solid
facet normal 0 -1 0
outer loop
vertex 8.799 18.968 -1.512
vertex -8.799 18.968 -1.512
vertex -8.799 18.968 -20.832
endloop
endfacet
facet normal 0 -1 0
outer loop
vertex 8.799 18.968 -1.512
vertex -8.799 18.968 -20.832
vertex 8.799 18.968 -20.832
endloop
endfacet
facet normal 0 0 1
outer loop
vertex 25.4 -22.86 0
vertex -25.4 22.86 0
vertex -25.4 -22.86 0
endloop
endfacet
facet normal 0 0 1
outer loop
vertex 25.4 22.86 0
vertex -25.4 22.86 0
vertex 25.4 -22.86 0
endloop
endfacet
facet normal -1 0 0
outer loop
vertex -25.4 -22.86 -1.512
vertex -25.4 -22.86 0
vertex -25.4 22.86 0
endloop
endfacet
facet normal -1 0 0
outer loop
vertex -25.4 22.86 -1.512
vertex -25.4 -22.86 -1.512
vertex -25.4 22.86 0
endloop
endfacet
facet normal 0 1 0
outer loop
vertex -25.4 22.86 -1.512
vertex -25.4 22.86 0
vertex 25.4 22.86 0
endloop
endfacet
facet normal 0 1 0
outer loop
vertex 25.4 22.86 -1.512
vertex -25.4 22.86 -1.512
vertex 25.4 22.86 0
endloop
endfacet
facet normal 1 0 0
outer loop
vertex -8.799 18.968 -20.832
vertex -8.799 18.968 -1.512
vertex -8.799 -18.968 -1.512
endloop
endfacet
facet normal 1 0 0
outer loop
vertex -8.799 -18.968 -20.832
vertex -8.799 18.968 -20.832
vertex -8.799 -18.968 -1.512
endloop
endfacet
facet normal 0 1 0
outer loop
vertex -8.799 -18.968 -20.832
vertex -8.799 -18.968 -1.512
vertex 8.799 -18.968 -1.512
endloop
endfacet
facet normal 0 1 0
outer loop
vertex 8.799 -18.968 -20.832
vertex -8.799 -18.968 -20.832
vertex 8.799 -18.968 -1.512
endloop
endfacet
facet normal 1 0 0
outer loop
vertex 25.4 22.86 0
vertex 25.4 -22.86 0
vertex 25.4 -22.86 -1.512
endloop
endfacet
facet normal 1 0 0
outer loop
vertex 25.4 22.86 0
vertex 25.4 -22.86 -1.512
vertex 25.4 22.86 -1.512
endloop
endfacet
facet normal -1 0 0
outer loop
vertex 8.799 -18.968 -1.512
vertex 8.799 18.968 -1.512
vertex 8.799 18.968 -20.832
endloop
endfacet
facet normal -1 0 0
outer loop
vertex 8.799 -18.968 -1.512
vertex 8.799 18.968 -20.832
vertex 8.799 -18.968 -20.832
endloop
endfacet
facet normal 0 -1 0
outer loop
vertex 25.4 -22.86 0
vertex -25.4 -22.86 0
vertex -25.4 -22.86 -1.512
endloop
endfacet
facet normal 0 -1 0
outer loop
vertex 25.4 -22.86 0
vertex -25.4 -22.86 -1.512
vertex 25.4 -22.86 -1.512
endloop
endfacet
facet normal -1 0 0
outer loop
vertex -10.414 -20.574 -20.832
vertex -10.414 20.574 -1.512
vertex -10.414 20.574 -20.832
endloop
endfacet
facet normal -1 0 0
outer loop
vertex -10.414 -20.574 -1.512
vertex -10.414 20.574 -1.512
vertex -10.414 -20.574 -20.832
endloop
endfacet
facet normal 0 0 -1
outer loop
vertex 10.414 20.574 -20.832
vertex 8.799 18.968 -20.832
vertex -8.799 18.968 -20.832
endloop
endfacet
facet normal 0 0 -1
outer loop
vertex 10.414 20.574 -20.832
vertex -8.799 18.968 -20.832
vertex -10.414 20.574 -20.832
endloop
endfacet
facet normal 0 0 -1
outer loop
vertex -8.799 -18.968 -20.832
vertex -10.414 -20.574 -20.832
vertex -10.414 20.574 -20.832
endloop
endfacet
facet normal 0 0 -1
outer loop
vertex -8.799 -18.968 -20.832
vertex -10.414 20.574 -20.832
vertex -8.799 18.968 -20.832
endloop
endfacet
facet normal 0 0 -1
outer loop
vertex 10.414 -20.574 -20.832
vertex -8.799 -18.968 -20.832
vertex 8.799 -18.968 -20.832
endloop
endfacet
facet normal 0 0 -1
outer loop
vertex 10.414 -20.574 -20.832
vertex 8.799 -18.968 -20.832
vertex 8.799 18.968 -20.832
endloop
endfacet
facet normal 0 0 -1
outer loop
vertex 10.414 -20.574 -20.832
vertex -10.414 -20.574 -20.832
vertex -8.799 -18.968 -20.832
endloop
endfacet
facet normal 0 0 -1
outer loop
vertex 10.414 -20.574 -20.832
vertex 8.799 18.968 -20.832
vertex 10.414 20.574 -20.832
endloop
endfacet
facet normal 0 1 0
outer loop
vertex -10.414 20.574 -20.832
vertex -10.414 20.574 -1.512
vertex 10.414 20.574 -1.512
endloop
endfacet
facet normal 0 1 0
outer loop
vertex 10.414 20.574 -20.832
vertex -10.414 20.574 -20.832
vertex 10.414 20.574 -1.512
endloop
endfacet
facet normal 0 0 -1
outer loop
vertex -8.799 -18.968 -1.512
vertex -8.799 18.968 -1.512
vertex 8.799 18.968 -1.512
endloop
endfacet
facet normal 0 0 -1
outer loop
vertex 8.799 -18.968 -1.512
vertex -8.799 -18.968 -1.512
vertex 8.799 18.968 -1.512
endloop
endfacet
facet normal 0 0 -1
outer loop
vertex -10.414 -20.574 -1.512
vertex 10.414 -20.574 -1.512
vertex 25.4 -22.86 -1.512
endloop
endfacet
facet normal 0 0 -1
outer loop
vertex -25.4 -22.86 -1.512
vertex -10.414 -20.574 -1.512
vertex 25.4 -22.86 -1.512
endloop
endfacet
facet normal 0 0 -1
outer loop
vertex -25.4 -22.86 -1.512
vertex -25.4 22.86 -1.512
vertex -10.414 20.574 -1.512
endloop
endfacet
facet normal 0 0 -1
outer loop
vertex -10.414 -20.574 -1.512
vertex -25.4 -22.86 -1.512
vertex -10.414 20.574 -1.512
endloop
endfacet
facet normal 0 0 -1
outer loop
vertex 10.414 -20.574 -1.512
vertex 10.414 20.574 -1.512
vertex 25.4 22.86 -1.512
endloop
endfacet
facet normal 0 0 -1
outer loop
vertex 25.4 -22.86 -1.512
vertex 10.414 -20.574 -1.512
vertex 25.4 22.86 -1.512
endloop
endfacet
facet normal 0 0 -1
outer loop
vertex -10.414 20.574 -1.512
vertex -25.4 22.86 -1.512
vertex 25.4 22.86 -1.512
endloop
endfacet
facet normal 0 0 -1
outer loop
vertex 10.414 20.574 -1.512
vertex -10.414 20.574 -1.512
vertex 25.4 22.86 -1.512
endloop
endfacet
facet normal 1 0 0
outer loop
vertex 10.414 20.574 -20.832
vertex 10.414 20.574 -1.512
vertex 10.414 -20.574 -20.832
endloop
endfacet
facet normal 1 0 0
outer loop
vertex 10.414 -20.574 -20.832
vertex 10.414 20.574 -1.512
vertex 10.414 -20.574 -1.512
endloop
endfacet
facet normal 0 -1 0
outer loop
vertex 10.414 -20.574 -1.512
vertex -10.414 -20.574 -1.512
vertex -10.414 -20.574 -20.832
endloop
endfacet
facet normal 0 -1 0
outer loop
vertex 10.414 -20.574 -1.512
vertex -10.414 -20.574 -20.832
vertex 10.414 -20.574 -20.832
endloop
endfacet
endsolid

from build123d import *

# Parameters (mm, degrees)
F0_W     = 50.8
F0_H     = 45.72
F1_DEPTH = 1.512496
F2_W     = 20.828
F2_H     = 41.148
F2_W_2   = 17.597928
F2_H_2   = 37.93566
F3_DEPTH = 19.319184


with BuildPart() as f1:
    # F0 (on Top) → F1 (new body)
    with BuildSketch(Plane.XY):
        Rectangle(F0_W, F0_H)
    extrude(amount=-F1_DEPTH)

    # F2 (on face) → F3 (join)
    with BuildSketch(Plane(origin=(0, 0, -1.512496), x_dir=(1, 0, 0), z_dir=(0, 0, -1))):
        Rectangle(F2_W, F2_H)
        Rectangle(F2_W_2, F2_H_2, mode=Mode.SUBTRACT)
    extrude(amount=F3_DEPTH)


solid = f1.part
